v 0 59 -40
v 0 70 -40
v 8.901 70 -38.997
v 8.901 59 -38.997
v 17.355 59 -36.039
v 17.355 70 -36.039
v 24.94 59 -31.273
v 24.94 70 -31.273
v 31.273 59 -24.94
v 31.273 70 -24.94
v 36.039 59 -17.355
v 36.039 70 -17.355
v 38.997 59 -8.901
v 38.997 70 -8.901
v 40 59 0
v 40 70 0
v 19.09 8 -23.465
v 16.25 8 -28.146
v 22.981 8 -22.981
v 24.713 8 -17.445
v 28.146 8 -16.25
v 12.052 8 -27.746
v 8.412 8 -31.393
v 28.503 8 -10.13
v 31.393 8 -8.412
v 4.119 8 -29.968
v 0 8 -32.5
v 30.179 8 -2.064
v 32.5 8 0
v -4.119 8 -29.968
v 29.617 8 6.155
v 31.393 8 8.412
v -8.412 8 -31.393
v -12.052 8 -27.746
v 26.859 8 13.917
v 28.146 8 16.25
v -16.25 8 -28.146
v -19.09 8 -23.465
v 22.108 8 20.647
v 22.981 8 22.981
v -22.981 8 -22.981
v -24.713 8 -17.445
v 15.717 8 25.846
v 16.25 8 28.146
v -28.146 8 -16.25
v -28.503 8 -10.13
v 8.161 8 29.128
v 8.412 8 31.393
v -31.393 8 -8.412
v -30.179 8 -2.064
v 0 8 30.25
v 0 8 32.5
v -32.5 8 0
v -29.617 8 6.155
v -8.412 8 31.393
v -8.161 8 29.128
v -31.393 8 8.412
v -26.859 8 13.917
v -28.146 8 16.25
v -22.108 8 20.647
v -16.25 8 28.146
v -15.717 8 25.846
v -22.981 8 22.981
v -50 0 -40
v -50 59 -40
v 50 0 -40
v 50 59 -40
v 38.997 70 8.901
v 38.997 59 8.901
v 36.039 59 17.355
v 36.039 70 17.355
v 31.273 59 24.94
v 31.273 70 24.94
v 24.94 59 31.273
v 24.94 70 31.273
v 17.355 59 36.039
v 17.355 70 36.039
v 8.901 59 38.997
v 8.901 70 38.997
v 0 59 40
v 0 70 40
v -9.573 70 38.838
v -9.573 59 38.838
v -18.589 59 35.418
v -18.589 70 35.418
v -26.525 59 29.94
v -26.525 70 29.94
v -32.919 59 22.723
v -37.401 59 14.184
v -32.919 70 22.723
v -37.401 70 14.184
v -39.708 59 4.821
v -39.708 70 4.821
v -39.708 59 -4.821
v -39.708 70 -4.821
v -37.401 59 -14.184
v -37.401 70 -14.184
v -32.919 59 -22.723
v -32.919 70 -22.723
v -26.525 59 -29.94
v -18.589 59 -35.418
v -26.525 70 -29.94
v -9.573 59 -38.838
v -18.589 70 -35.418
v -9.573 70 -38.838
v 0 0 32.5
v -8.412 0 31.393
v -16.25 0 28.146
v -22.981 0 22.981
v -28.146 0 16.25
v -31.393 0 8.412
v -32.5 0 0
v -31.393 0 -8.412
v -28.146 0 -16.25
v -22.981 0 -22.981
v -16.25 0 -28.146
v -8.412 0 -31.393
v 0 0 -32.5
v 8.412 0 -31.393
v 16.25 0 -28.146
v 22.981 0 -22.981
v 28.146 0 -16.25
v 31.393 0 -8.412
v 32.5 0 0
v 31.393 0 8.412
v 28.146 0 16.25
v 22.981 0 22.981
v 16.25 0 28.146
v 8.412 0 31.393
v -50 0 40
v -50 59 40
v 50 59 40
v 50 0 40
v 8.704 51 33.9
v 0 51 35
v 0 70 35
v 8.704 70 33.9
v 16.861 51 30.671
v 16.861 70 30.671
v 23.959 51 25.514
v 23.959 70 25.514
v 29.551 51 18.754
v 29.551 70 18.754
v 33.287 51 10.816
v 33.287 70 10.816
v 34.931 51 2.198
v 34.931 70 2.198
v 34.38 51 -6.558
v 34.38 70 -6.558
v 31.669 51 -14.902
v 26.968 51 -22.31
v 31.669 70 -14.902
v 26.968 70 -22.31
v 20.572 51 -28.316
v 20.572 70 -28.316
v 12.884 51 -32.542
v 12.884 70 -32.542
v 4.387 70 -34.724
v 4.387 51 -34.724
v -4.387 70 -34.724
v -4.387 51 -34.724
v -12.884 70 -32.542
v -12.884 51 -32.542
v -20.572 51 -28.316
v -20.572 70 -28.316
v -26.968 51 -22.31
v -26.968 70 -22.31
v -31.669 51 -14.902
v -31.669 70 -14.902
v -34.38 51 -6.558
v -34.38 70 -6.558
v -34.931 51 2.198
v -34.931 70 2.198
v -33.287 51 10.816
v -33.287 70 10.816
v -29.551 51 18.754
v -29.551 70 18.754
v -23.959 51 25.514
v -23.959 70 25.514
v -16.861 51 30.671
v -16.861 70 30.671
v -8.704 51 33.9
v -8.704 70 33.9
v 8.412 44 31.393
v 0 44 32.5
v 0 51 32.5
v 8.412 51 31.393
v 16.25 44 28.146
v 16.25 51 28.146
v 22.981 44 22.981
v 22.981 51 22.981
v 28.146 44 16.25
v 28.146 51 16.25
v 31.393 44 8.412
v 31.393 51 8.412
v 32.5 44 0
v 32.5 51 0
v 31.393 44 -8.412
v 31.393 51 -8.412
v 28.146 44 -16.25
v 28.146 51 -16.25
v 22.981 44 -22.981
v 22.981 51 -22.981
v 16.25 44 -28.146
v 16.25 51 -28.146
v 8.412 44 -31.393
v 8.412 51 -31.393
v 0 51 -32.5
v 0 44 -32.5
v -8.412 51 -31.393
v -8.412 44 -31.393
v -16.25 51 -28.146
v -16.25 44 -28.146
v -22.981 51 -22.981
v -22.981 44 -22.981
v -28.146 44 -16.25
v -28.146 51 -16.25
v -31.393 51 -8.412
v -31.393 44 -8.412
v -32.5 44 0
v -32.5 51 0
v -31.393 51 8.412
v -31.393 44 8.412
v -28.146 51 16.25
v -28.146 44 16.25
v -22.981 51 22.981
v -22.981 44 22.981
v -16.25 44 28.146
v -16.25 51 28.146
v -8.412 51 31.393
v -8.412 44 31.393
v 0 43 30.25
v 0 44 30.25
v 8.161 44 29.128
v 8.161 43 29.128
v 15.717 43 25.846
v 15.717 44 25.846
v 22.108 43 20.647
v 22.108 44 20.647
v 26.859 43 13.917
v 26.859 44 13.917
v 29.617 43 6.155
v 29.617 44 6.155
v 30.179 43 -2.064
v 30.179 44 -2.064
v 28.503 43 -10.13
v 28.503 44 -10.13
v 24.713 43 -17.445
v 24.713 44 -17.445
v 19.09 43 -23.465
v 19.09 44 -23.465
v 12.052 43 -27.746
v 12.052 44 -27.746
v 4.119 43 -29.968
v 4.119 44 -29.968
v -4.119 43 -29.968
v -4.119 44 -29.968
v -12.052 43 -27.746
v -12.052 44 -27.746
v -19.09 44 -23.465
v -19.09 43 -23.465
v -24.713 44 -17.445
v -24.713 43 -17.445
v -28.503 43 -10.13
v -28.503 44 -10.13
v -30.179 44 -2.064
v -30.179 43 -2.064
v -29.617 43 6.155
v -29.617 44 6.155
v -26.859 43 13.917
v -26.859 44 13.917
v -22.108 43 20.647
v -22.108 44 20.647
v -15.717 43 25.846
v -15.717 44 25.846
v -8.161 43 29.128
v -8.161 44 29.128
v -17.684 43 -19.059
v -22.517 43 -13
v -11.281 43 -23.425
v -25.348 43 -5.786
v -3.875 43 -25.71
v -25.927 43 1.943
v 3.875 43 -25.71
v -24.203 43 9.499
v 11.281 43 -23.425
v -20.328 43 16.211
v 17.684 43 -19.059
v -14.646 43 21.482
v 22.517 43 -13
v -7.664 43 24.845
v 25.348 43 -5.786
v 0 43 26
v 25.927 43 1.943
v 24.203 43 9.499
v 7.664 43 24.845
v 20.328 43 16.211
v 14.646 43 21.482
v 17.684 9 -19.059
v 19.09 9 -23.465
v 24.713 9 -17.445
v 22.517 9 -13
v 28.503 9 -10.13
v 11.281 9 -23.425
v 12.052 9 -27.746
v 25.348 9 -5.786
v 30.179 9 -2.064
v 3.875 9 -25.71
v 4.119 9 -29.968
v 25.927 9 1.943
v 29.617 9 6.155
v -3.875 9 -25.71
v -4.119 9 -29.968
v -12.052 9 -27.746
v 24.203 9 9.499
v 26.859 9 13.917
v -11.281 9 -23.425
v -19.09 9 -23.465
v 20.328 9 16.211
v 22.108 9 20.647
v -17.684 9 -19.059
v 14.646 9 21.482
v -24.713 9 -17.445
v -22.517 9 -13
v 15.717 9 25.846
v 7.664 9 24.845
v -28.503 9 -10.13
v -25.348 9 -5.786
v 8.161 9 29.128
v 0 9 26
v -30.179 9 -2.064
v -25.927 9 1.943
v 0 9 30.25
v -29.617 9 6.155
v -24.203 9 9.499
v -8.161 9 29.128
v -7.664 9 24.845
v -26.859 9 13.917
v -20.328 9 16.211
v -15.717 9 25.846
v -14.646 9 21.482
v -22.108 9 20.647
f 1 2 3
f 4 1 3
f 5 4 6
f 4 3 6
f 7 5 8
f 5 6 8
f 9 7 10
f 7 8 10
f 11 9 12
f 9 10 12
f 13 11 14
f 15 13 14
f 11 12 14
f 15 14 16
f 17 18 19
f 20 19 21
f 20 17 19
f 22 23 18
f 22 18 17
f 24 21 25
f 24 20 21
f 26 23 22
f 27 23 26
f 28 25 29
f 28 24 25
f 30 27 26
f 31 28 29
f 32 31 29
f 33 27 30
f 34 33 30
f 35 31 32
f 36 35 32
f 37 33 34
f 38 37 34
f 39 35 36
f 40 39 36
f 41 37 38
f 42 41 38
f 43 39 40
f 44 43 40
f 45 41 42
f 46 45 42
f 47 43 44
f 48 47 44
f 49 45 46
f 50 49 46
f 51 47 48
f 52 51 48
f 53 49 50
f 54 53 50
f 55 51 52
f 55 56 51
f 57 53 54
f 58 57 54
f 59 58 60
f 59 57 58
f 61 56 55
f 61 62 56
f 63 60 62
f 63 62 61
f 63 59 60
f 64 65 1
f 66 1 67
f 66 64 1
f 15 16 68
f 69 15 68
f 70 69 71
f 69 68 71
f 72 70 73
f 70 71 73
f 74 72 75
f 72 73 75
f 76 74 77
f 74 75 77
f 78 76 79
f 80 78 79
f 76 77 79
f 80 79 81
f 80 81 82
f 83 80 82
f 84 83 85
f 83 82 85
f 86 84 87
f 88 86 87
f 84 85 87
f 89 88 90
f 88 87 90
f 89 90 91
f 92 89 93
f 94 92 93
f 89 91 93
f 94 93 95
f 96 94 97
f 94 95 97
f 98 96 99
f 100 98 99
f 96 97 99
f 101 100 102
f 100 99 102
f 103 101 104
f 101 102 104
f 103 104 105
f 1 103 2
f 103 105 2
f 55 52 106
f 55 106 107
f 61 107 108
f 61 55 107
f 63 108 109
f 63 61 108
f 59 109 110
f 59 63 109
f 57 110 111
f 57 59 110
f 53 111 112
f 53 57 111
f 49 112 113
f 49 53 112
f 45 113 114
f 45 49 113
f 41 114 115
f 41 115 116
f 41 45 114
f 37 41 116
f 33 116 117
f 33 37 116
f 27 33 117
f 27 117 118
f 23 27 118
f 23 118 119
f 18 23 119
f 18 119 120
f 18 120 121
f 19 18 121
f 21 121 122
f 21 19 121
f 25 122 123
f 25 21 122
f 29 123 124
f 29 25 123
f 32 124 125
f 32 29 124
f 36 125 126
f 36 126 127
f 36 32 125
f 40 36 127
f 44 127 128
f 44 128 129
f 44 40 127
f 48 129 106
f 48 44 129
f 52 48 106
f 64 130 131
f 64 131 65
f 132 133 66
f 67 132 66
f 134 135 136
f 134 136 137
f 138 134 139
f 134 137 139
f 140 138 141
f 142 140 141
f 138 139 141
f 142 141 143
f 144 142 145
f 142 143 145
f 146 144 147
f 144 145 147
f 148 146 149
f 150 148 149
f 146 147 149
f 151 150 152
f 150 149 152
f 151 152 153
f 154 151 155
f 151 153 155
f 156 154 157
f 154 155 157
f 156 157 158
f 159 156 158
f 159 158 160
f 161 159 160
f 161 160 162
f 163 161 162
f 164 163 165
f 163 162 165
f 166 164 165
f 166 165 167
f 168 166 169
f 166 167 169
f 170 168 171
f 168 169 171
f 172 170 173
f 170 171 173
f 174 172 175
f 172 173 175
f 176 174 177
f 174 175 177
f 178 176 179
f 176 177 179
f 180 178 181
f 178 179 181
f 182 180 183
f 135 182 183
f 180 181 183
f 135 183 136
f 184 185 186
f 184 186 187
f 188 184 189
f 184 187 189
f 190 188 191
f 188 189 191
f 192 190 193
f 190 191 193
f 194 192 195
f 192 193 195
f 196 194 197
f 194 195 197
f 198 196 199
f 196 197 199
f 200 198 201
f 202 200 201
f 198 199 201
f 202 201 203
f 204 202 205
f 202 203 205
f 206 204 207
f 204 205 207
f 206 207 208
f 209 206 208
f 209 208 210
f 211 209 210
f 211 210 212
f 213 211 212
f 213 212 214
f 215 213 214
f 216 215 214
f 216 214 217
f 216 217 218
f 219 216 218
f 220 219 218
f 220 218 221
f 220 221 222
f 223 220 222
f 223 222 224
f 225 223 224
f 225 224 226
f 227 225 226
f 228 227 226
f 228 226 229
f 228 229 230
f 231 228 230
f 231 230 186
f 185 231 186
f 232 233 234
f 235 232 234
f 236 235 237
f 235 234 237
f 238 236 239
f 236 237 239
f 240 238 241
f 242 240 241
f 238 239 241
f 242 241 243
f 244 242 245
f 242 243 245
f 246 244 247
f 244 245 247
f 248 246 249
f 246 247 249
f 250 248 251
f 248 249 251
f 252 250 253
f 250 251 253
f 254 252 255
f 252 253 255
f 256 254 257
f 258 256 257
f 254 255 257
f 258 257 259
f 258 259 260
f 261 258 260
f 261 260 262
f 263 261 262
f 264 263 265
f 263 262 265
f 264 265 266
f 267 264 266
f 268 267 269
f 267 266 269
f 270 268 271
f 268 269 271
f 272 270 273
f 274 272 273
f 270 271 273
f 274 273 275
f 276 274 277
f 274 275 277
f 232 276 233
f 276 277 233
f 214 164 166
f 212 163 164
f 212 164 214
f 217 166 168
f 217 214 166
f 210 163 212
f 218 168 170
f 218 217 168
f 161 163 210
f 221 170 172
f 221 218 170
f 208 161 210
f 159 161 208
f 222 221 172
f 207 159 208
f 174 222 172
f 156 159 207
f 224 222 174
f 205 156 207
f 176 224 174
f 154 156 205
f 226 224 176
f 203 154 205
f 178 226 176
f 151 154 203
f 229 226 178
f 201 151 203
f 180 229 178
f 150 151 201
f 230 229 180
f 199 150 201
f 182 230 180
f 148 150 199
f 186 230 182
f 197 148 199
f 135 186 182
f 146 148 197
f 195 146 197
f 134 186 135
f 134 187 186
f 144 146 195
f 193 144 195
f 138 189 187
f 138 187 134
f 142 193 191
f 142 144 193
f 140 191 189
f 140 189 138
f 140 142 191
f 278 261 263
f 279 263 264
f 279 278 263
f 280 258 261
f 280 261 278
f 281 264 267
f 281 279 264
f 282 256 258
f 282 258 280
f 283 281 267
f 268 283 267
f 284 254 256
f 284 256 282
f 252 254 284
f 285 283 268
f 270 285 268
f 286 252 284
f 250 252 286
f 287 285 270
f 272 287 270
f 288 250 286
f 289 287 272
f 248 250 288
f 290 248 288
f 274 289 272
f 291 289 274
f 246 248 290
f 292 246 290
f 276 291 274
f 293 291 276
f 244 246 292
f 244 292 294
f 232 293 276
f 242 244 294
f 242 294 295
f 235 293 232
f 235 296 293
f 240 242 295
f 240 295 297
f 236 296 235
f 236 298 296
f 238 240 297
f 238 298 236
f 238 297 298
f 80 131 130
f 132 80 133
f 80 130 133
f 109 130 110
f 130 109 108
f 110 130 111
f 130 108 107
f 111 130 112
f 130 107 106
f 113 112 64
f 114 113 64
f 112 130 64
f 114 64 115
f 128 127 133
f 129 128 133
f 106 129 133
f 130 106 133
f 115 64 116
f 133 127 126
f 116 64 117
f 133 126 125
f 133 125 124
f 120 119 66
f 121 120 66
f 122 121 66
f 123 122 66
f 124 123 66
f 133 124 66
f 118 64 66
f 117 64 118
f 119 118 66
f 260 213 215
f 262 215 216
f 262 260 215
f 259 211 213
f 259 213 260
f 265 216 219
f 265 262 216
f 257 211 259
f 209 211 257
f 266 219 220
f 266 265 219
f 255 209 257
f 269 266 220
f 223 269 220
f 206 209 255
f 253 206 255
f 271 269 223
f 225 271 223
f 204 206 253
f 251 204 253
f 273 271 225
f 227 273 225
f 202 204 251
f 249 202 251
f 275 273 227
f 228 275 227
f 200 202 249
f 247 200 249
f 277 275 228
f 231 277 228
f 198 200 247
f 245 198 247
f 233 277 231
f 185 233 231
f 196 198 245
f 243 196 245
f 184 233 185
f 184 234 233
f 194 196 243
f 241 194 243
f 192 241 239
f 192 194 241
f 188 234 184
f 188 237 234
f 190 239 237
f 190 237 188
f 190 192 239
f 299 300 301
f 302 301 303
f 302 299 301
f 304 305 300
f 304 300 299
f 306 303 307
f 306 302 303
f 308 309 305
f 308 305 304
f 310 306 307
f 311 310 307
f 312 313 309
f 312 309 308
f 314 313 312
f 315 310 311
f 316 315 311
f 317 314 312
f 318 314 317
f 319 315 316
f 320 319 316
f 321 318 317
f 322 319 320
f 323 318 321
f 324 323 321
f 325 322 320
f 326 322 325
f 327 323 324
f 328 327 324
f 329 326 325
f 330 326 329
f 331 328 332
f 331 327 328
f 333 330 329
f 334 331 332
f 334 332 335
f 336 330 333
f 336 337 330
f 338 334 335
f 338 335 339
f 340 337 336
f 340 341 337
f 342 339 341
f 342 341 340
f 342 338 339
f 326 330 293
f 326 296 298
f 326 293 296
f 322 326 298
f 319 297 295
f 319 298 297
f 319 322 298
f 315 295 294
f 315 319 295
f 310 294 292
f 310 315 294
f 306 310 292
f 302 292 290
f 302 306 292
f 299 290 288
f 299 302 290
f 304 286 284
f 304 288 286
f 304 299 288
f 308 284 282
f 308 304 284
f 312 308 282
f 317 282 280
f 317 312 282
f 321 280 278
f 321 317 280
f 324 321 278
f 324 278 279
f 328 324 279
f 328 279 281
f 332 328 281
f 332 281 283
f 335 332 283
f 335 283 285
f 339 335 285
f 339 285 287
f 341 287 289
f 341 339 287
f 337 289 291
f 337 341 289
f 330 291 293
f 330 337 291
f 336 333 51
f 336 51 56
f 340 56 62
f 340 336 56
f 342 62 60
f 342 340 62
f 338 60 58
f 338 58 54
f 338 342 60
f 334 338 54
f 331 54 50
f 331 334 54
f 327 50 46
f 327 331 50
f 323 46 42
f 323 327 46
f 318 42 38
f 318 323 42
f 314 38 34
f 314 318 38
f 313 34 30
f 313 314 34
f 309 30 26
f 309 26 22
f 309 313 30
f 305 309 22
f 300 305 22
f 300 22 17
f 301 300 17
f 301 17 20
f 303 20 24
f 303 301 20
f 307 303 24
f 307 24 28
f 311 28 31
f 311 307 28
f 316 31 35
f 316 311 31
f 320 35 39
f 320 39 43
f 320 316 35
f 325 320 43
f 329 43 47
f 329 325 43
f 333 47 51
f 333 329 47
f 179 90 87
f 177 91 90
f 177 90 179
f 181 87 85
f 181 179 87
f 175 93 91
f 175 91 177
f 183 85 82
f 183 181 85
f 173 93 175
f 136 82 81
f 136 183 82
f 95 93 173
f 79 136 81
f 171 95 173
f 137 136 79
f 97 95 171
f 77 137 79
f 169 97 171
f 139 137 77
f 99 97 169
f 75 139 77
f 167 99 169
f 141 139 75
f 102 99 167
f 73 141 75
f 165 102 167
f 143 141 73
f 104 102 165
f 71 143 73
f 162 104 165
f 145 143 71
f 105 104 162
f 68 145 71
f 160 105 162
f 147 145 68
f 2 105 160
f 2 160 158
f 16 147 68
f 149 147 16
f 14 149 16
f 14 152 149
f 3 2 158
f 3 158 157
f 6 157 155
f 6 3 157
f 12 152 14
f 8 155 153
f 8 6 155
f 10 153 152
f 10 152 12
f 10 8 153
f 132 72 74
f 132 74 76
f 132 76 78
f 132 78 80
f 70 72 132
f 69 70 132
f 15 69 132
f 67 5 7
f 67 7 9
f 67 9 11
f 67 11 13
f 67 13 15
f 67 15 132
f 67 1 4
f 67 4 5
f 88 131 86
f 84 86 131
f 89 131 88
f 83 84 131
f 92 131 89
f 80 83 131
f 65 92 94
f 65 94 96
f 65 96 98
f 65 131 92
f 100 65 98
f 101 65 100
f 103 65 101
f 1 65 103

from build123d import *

# Parameters (mm, degrees)
SKETCH1_W           = 100
SKETCH1_H           = 80
SKETCH1_R           = 26
BOSS_EXTRUDE1_DEPTH = 70
SKETCH2_R           = 32.5
CUT_EXTRUDE1_DEPTH  = 27
BOSS_EXTRUDE2_START = 1
SKETCH4_R           = 32.5
SKETCH4_R_2         = 30.25
BOSS_EXTRUDE2_DEPTH = 1
SKETCH5_R           = 35
CUT_EXTRUDE2_DEPTH  = 19
CUT_EXTRUDE3_START  = -8
SKETCH6_R           = 32.5
CUT_EXTRUDE3_DEPTH  = 8
CUT_EXTRUDE4_START  = -1
SKETCH7_R           = 30.25
CUT_EXTRUDE4_DEPTH  = 1
CUT_EXTRUDE5_DEPTH  = 11


with BuildPart() as part:
    # Sketch1 → Boss-Extrude1 (new body)
    with BuildSketch(Plane(origin=(0, 0, 0), x_dir=(1, 0, 0), z_dir=(0, 1, 0))):
        Rectangle(SKETCH1_W, SKETCH1_H)
        with Locations(Location((0, 0, 0), (0, 0, 270))):
            Circle(SKETCH1_R, mode=Mode.SUBTRACT)
    extrude(amount=BOSS_EXTRUDE1_DEPTH)

    # Sketch2 → Cut-Extrude1 (cut)
    with BuildSketch(Plane(origin=(0, 70, 0), x_dir=(1, 0, 0), z_dir=(0, 1, 0))):
        with Locations(Location((0, 0, 0), (0, 0, 270))):
            Circle(SKETCH2_R)
    extrude(amount=-CUT_EXTRUDE1_DEPTH, mode=Mode.SUBTRACT)

    # Sketch4 → Boss-Extrude2 (add)
    with BuildSketch(Plane(origin=(0, 43, 0), x_dir=(1, 0, 0), z_dir=(0, 1, 0)).offset(BOSS_EXTRUDE2_START)):
        with Locations(Location((0, 0, 0), (0, 0, 270))):
            Circle(SKETCH4_R)
        with Locations(Location((0, 0, 0), (0, 0, 270))):
            Circle(SKETCH4_R_2, mode=Mode.SUBTRACT)
    extrude(amount=-BOSS_EXTRUDE2_DEPTH)

    # Sketch5 → Cut-Extrude2 (cut)
    with BuildSketch(Plane(origin=(0, 70, 0), x_dir=(1, 0, 0), z_dir=(0, 1, 0))):
        with Locations(Location((0, 0, 0), (0, 0, 270))):
            Circle(SKETCH5_R)
    extrude(amount=-CUT_EXTRUDE2_DEPTH, mode=Mode.SUBTRACT)

    # Sketch6 → Cut-Extrude3 (cut)
    with BuildSketch(Plane.XZ.offset(CUT_EXTRUDE3_START)):
        with Locations(Location((0, 0, 0), (0, 0, 90))):
            Circle(SKETCH6_R)
    extrude(amount=CUT_EXTRUDE3_DEPTH, mode=Mode.SUBTRACT)

    # Sketch7 → Cut-Extrude4 (cut)
    with BuildSketch(Plane.XZ.offset(-8).offset(CUT_EXTRUDE4_START)):
        with Locations(Location((0, 0, 0), (0, 0, 90))):
            Circle(SKETCH7_R)
    extrude(amount=CUT_EXTRUDE4_DEPTH, mode=Mode.SUBTRACT)

    # Sketch8 → Cut-Extrude5 (cut)
    with BuildSketch(Plane(origin=(0, 70, 0), x_dir=(1, 0, 0), z_dir=(0, 1, 0))):
        with BuildLine():
            Line((50, 40), (0, 40))
            ThreePointArc((0, 40), (28.284271247, 28.284271247), (40, 0))
            ThreePointArc((40, 0), (28.284271247, -28.284271247), (0, -40))
            Line((0, -40), (50, -40))
            Line((50, -40), (50, 40))
        make_face()
        with BuildLine():
            Line((0, 40), (-50, 40))
            Line((-50, 40), (-50, -40))
            Line((-50, -40), (0, -40))
            ThreePointArc((0, -40), (-40, 0), (0, 40))
        make_face()
    extrude(amount=-CUT_EXTRUDE5_DEPTH, mode=Mode.SUBTRACT)


solid = part.part
